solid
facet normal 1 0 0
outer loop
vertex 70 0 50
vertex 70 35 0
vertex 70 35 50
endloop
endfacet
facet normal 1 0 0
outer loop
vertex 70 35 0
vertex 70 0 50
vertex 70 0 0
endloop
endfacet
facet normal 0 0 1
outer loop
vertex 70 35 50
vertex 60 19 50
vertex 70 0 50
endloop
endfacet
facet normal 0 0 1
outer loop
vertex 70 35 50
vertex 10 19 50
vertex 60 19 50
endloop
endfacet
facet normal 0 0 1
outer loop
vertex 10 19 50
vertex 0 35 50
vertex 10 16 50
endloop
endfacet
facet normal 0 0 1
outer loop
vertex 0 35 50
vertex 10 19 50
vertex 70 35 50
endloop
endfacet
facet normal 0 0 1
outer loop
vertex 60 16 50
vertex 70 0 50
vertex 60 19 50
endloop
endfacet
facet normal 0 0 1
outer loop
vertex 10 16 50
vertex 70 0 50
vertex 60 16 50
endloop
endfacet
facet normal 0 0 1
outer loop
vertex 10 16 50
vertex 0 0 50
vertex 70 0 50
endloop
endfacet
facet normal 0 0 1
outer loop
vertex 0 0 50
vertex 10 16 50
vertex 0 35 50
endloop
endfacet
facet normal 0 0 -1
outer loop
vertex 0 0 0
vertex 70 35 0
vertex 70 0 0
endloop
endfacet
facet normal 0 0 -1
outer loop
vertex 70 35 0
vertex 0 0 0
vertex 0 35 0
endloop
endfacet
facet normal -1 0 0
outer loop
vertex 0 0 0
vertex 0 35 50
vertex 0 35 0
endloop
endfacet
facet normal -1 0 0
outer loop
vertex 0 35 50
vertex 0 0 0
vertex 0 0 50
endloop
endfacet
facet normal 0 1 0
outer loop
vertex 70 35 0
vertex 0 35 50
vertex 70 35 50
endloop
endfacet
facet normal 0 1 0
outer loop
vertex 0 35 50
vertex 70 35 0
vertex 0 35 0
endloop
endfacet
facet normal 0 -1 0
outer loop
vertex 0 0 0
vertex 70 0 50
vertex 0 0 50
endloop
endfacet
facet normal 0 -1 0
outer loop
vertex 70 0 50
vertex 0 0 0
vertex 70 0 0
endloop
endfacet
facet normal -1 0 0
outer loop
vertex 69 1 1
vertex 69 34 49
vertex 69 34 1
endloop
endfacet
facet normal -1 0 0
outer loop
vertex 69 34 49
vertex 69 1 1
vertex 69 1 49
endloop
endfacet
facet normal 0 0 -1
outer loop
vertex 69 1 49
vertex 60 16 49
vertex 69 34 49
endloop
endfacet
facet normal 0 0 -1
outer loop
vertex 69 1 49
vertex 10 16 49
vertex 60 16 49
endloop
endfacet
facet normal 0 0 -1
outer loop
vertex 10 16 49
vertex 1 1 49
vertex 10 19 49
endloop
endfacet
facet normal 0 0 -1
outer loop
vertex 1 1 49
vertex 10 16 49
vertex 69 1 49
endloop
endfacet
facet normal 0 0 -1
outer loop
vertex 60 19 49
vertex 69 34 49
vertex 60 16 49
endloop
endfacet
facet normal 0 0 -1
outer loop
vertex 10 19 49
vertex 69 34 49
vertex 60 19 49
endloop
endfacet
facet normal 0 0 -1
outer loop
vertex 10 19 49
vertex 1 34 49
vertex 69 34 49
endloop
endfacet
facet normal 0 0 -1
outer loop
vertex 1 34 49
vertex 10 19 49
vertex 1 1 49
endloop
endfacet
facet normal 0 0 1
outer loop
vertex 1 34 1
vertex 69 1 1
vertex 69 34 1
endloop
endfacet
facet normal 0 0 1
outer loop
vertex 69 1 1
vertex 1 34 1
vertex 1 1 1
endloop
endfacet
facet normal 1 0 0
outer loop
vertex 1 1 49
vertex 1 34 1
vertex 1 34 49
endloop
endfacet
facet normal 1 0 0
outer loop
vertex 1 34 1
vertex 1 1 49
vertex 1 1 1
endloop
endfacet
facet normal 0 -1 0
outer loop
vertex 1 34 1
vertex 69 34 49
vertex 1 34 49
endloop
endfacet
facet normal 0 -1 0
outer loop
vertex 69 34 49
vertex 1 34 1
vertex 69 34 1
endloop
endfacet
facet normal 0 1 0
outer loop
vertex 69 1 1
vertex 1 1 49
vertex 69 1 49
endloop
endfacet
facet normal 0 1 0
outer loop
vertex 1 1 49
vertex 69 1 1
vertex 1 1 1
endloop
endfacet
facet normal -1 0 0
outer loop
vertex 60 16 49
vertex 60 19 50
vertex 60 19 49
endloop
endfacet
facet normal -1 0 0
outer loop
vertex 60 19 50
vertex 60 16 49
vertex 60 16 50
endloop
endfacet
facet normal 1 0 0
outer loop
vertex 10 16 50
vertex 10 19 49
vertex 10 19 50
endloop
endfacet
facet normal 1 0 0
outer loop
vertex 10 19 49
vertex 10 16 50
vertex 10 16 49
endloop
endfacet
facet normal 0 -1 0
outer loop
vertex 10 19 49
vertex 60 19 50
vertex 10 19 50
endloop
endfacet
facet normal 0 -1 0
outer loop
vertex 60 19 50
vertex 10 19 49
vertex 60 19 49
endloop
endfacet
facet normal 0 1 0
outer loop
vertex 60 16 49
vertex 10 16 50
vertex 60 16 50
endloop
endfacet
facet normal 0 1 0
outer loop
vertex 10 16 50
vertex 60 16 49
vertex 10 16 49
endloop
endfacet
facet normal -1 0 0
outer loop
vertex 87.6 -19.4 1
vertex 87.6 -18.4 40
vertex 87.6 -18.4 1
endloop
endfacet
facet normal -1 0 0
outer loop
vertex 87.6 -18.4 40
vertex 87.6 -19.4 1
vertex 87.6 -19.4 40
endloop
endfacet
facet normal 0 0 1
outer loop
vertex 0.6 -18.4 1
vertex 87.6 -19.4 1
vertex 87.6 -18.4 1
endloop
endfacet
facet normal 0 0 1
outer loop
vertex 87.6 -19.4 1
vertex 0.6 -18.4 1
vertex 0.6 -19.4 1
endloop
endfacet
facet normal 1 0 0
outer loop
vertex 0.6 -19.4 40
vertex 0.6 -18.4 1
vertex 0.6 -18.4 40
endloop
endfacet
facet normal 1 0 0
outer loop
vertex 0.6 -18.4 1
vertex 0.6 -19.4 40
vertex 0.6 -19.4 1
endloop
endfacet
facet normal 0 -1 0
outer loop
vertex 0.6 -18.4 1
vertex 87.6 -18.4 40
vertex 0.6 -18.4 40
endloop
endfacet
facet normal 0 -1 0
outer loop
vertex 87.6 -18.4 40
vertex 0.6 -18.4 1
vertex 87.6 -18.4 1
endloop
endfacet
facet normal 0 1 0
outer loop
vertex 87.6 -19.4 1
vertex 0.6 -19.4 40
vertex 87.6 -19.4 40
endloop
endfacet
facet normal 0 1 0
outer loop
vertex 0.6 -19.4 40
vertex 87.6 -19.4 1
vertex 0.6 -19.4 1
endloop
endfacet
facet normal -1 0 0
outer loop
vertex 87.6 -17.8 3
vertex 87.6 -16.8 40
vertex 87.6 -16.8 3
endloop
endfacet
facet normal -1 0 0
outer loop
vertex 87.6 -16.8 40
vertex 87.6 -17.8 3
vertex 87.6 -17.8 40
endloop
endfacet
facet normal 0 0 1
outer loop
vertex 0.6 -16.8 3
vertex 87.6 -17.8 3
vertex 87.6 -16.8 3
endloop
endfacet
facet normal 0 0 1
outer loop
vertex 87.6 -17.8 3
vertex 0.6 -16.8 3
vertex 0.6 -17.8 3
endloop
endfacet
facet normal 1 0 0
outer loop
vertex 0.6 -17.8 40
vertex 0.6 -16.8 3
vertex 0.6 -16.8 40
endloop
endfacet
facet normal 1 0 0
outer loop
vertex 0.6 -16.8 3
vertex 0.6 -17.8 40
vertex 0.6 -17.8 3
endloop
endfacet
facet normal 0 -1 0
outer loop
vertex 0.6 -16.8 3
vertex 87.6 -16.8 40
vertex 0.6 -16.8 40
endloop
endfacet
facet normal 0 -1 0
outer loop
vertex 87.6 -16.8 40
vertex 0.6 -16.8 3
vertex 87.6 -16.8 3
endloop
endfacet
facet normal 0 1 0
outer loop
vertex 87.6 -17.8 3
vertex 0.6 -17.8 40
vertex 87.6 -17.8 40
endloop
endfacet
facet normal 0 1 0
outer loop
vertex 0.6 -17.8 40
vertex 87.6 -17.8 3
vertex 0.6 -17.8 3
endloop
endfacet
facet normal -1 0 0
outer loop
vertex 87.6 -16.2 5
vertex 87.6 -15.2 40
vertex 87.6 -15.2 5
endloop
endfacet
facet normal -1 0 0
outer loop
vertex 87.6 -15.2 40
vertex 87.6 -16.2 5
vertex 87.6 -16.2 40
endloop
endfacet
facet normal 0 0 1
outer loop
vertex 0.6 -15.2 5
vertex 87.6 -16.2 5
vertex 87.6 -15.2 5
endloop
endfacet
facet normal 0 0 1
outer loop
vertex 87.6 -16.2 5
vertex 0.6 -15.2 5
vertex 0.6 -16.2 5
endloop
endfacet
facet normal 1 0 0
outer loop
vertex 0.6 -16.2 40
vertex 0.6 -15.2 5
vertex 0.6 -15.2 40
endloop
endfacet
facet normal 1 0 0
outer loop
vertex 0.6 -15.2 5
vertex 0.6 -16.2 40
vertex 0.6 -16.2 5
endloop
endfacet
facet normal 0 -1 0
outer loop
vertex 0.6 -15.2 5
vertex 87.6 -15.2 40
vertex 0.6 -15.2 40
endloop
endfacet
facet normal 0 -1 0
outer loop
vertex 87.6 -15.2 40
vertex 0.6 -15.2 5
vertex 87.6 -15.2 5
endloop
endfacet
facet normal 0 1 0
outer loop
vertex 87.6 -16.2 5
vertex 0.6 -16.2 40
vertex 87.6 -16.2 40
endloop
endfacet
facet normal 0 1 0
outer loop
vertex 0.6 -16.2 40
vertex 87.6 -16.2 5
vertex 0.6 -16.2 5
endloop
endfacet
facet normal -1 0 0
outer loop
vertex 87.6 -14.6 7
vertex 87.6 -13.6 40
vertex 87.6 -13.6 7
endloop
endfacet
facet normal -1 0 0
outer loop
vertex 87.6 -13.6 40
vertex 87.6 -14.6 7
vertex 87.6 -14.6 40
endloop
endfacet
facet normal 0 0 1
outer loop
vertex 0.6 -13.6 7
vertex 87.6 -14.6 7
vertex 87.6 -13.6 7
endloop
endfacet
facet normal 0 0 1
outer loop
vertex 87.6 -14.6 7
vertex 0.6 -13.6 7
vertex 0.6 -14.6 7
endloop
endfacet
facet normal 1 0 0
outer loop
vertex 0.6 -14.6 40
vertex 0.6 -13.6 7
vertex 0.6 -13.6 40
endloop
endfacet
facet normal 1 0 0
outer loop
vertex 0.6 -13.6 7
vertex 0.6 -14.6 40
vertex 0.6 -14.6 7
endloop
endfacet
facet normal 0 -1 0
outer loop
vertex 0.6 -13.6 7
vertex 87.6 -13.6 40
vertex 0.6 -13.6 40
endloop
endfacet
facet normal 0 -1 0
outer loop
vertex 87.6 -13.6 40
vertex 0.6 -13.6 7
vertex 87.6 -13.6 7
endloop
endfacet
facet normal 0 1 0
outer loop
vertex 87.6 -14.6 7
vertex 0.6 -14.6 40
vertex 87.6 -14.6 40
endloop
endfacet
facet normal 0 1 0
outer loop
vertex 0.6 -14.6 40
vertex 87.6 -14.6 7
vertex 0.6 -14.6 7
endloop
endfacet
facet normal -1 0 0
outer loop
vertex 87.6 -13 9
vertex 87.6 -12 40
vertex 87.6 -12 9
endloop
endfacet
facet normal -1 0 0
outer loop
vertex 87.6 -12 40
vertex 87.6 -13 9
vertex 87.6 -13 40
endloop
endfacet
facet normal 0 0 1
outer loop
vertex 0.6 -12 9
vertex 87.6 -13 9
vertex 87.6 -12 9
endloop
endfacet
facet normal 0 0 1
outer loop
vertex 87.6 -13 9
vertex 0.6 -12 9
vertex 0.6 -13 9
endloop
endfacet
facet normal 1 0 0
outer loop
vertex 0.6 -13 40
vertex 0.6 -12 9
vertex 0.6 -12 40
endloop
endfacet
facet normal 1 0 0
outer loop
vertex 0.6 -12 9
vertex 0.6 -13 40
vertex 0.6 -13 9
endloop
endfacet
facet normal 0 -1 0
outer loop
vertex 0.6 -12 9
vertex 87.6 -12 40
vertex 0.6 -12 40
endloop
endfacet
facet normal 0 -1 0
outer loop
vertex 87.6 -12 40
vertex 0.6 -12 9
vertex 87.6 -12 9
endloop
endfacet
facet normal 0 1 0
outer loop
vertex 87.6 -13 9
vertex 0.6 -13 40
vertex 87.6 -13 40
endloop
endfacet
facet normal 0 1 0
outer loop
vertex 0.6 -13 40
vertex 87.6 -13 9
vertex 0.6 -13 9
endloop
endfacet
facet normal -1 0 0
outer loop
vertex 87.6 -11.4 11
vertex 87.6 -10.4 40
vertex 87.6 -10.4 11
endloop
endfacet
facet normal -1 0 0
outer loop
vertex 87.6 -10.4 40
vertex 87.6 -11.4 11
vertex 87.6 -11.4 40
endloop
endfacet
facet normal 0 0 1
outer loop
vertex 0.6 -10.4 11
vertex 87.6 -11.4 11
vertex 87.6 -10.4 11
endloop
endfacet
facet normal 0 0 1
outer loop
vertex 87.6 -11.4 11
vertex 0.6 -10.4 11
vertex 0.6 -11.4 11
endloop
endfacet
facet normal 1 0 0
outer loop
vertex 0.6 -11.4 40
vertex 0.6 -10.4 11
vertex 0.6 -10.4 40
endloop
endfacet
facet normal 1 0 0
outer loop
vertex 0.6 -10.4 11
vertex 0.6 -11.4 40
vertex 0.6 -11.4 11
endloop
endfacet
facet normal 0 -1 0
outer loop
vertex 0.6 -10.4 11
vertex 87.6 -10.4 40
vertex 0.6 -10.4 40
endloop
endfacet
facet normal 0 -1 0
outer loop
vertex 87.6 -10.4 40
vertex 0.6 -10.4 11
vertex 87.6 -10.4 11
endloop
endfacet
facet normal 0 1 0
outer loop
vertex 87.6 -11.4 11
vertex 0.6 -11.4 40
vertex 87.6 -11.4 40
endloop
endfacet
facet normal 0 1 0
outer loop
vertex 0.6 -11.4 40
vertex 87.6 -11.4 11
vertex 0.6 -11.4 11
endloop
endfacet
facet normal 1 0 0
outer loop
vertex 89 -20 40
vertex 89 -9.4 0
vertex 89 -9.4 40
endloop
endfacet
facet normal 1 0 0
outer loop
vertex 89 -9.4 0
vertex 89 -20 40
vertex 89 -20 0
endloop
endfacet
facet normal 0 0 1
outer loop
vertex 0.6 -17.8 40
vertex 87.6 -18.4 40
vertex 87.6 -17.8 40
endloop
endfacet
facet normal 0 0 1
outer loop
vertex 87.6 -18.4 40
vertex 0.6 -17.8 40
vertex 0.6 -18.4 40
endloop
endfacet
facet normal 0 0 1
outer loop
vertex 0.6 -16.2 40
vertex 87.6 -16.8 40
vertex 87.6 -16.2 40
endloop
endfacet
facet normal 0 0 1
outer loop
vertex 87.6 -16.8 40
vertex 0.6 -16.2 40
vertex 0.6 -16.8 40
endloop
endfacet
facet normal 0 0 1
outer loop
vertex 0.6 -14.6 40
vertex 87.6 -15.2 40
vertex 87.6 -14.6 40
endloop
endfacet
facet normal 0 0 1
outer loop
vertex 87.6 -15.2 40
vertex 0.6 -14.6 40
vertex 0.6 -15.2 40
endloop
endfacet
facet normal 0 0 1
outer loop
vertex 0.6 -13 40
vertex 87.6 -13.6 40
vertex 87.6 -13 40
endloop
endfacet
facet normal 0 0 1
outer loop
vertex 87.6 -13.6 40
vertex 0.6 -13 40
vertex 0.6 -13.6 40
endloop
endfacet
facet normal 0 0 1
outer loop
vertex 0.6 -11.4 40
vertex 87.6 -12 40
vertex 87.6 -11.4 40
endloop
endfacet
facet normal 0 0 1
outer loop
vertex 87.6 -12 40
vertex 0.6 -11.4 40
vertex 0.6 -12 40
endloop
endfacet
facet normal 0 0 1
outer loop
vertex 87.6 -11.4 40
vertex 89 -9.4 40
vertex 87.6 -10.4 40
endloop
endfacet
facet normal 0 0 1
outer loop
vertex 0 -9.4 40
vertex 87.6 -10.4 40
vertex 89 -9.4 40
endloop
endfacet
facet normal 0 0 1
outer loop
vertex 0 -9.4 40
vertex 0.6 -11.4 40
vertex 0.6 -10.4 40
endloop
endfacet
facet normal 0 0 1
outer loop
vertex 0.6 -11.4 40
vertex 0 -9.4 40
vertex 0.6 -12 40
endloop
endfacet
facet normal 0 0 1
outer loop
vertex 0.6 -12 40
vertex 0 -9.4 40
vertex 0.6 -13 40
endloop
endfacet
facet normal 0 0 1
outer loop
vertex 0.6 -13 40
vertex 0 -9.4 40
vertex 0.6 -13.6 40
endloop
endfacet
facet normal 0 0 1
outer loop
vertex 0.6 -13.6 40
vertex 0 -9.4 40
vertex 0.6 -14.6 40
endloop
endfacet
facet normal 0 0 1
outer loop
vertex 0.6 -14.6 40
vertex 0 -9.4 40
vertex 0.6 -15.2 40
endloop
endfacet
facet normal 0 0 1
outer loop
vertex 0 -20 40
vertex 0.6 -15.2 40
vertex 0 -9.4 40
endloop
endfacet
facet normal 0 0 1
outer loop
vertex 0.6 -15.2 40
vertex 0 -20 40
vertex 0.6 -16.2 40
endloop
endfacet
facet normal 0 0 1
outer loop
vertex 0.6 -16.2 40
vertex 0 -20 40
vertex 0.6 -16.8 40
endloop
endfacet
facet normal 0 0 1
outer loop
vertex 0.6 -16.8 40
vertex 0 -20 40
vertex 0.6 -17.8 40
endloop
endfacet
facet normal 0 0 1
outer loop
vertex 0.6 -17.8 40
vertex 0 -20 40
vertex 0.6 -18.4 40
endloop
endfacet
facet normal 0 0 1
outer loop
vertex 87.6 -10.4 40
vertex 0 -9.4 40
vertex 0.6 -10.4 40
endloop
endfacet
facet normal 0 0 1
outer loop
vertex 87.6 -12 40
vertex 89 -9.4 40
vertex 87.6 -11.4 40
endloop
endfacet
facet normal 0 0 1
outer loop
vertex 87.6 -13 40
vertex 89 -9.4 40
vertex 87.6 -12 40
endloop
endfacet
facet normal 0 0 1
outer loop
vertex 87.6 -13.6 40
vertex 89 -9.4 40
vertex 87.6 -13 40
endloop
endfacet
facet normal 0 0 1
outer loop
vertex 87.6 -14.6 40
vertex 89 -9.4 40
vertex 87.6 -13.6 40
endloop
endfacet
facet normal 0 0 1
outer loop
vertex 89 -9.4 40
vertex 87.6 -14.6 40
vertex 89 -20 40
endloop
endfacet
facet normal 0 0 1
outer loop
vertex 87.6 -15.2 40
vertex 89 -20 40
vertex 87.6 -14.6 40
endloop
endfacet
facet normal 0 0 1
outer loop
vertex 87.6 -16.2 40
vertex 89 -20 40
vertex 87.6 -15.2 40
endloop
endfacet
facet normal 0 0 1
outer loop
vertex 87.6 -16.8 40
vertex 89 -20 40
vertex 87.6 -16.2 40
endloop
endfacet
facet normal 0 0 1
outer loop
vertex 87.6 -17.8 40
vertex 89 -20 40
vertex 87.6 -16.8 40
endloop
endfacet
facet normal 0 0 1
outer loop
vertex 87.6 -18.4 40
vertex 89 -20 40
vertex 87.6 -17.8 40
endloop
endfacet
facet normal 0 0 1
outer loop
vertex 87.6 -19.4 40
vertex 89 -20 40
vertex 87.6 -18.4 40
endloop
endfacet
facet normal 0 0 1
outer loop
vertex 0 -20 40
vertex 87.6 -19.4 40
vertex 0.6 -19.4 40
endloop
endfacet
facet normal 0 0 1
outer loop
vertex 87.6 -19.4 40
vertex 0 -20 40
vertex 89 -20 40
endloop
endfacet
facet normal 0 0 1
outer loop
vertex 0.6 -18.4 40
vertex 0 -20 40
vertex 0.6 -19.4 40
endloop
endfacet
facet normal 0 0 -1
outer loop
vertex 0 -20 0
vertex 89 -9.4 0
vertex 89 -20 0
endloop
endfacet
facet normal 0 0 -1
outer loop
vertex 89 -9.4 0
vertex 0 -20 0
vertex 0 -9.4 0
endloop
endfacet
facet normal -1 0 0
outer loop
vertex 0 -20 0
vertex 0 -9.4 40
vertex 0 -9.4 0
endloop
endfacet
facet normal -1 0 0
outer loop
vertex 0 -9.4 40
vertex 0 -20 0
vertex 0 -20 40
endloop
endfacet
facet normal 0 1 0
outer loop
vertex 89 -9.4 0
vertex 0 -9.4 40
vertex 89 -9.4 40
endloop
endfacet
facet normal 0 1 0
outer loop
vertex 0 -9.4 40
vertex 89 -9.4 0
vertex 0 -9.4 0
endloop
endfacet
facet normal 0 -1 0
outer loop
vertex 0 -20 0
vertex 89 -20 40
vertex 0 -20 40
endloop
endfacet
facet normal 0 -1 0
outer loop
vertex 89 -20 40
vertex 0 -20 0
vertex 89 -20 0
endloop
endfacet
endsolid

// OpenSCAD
difference(){
    cube([70,35,50]);
    translate([1,1,1]){
        cube([68,33,48]);
    }
    translate([10,16,45]){
        cube([50,3,10]);
    }
}

translate([0,-20,0]) {
    difference() {
        cube([89,1.6*6+1,40]);
        translate([.6,.6,1]) {
            for(p=[0:5]) {
                translate([0,p*1.6,p*2]) {
                    cube([87,1,54]);
                }
            }
        }
    }
}
